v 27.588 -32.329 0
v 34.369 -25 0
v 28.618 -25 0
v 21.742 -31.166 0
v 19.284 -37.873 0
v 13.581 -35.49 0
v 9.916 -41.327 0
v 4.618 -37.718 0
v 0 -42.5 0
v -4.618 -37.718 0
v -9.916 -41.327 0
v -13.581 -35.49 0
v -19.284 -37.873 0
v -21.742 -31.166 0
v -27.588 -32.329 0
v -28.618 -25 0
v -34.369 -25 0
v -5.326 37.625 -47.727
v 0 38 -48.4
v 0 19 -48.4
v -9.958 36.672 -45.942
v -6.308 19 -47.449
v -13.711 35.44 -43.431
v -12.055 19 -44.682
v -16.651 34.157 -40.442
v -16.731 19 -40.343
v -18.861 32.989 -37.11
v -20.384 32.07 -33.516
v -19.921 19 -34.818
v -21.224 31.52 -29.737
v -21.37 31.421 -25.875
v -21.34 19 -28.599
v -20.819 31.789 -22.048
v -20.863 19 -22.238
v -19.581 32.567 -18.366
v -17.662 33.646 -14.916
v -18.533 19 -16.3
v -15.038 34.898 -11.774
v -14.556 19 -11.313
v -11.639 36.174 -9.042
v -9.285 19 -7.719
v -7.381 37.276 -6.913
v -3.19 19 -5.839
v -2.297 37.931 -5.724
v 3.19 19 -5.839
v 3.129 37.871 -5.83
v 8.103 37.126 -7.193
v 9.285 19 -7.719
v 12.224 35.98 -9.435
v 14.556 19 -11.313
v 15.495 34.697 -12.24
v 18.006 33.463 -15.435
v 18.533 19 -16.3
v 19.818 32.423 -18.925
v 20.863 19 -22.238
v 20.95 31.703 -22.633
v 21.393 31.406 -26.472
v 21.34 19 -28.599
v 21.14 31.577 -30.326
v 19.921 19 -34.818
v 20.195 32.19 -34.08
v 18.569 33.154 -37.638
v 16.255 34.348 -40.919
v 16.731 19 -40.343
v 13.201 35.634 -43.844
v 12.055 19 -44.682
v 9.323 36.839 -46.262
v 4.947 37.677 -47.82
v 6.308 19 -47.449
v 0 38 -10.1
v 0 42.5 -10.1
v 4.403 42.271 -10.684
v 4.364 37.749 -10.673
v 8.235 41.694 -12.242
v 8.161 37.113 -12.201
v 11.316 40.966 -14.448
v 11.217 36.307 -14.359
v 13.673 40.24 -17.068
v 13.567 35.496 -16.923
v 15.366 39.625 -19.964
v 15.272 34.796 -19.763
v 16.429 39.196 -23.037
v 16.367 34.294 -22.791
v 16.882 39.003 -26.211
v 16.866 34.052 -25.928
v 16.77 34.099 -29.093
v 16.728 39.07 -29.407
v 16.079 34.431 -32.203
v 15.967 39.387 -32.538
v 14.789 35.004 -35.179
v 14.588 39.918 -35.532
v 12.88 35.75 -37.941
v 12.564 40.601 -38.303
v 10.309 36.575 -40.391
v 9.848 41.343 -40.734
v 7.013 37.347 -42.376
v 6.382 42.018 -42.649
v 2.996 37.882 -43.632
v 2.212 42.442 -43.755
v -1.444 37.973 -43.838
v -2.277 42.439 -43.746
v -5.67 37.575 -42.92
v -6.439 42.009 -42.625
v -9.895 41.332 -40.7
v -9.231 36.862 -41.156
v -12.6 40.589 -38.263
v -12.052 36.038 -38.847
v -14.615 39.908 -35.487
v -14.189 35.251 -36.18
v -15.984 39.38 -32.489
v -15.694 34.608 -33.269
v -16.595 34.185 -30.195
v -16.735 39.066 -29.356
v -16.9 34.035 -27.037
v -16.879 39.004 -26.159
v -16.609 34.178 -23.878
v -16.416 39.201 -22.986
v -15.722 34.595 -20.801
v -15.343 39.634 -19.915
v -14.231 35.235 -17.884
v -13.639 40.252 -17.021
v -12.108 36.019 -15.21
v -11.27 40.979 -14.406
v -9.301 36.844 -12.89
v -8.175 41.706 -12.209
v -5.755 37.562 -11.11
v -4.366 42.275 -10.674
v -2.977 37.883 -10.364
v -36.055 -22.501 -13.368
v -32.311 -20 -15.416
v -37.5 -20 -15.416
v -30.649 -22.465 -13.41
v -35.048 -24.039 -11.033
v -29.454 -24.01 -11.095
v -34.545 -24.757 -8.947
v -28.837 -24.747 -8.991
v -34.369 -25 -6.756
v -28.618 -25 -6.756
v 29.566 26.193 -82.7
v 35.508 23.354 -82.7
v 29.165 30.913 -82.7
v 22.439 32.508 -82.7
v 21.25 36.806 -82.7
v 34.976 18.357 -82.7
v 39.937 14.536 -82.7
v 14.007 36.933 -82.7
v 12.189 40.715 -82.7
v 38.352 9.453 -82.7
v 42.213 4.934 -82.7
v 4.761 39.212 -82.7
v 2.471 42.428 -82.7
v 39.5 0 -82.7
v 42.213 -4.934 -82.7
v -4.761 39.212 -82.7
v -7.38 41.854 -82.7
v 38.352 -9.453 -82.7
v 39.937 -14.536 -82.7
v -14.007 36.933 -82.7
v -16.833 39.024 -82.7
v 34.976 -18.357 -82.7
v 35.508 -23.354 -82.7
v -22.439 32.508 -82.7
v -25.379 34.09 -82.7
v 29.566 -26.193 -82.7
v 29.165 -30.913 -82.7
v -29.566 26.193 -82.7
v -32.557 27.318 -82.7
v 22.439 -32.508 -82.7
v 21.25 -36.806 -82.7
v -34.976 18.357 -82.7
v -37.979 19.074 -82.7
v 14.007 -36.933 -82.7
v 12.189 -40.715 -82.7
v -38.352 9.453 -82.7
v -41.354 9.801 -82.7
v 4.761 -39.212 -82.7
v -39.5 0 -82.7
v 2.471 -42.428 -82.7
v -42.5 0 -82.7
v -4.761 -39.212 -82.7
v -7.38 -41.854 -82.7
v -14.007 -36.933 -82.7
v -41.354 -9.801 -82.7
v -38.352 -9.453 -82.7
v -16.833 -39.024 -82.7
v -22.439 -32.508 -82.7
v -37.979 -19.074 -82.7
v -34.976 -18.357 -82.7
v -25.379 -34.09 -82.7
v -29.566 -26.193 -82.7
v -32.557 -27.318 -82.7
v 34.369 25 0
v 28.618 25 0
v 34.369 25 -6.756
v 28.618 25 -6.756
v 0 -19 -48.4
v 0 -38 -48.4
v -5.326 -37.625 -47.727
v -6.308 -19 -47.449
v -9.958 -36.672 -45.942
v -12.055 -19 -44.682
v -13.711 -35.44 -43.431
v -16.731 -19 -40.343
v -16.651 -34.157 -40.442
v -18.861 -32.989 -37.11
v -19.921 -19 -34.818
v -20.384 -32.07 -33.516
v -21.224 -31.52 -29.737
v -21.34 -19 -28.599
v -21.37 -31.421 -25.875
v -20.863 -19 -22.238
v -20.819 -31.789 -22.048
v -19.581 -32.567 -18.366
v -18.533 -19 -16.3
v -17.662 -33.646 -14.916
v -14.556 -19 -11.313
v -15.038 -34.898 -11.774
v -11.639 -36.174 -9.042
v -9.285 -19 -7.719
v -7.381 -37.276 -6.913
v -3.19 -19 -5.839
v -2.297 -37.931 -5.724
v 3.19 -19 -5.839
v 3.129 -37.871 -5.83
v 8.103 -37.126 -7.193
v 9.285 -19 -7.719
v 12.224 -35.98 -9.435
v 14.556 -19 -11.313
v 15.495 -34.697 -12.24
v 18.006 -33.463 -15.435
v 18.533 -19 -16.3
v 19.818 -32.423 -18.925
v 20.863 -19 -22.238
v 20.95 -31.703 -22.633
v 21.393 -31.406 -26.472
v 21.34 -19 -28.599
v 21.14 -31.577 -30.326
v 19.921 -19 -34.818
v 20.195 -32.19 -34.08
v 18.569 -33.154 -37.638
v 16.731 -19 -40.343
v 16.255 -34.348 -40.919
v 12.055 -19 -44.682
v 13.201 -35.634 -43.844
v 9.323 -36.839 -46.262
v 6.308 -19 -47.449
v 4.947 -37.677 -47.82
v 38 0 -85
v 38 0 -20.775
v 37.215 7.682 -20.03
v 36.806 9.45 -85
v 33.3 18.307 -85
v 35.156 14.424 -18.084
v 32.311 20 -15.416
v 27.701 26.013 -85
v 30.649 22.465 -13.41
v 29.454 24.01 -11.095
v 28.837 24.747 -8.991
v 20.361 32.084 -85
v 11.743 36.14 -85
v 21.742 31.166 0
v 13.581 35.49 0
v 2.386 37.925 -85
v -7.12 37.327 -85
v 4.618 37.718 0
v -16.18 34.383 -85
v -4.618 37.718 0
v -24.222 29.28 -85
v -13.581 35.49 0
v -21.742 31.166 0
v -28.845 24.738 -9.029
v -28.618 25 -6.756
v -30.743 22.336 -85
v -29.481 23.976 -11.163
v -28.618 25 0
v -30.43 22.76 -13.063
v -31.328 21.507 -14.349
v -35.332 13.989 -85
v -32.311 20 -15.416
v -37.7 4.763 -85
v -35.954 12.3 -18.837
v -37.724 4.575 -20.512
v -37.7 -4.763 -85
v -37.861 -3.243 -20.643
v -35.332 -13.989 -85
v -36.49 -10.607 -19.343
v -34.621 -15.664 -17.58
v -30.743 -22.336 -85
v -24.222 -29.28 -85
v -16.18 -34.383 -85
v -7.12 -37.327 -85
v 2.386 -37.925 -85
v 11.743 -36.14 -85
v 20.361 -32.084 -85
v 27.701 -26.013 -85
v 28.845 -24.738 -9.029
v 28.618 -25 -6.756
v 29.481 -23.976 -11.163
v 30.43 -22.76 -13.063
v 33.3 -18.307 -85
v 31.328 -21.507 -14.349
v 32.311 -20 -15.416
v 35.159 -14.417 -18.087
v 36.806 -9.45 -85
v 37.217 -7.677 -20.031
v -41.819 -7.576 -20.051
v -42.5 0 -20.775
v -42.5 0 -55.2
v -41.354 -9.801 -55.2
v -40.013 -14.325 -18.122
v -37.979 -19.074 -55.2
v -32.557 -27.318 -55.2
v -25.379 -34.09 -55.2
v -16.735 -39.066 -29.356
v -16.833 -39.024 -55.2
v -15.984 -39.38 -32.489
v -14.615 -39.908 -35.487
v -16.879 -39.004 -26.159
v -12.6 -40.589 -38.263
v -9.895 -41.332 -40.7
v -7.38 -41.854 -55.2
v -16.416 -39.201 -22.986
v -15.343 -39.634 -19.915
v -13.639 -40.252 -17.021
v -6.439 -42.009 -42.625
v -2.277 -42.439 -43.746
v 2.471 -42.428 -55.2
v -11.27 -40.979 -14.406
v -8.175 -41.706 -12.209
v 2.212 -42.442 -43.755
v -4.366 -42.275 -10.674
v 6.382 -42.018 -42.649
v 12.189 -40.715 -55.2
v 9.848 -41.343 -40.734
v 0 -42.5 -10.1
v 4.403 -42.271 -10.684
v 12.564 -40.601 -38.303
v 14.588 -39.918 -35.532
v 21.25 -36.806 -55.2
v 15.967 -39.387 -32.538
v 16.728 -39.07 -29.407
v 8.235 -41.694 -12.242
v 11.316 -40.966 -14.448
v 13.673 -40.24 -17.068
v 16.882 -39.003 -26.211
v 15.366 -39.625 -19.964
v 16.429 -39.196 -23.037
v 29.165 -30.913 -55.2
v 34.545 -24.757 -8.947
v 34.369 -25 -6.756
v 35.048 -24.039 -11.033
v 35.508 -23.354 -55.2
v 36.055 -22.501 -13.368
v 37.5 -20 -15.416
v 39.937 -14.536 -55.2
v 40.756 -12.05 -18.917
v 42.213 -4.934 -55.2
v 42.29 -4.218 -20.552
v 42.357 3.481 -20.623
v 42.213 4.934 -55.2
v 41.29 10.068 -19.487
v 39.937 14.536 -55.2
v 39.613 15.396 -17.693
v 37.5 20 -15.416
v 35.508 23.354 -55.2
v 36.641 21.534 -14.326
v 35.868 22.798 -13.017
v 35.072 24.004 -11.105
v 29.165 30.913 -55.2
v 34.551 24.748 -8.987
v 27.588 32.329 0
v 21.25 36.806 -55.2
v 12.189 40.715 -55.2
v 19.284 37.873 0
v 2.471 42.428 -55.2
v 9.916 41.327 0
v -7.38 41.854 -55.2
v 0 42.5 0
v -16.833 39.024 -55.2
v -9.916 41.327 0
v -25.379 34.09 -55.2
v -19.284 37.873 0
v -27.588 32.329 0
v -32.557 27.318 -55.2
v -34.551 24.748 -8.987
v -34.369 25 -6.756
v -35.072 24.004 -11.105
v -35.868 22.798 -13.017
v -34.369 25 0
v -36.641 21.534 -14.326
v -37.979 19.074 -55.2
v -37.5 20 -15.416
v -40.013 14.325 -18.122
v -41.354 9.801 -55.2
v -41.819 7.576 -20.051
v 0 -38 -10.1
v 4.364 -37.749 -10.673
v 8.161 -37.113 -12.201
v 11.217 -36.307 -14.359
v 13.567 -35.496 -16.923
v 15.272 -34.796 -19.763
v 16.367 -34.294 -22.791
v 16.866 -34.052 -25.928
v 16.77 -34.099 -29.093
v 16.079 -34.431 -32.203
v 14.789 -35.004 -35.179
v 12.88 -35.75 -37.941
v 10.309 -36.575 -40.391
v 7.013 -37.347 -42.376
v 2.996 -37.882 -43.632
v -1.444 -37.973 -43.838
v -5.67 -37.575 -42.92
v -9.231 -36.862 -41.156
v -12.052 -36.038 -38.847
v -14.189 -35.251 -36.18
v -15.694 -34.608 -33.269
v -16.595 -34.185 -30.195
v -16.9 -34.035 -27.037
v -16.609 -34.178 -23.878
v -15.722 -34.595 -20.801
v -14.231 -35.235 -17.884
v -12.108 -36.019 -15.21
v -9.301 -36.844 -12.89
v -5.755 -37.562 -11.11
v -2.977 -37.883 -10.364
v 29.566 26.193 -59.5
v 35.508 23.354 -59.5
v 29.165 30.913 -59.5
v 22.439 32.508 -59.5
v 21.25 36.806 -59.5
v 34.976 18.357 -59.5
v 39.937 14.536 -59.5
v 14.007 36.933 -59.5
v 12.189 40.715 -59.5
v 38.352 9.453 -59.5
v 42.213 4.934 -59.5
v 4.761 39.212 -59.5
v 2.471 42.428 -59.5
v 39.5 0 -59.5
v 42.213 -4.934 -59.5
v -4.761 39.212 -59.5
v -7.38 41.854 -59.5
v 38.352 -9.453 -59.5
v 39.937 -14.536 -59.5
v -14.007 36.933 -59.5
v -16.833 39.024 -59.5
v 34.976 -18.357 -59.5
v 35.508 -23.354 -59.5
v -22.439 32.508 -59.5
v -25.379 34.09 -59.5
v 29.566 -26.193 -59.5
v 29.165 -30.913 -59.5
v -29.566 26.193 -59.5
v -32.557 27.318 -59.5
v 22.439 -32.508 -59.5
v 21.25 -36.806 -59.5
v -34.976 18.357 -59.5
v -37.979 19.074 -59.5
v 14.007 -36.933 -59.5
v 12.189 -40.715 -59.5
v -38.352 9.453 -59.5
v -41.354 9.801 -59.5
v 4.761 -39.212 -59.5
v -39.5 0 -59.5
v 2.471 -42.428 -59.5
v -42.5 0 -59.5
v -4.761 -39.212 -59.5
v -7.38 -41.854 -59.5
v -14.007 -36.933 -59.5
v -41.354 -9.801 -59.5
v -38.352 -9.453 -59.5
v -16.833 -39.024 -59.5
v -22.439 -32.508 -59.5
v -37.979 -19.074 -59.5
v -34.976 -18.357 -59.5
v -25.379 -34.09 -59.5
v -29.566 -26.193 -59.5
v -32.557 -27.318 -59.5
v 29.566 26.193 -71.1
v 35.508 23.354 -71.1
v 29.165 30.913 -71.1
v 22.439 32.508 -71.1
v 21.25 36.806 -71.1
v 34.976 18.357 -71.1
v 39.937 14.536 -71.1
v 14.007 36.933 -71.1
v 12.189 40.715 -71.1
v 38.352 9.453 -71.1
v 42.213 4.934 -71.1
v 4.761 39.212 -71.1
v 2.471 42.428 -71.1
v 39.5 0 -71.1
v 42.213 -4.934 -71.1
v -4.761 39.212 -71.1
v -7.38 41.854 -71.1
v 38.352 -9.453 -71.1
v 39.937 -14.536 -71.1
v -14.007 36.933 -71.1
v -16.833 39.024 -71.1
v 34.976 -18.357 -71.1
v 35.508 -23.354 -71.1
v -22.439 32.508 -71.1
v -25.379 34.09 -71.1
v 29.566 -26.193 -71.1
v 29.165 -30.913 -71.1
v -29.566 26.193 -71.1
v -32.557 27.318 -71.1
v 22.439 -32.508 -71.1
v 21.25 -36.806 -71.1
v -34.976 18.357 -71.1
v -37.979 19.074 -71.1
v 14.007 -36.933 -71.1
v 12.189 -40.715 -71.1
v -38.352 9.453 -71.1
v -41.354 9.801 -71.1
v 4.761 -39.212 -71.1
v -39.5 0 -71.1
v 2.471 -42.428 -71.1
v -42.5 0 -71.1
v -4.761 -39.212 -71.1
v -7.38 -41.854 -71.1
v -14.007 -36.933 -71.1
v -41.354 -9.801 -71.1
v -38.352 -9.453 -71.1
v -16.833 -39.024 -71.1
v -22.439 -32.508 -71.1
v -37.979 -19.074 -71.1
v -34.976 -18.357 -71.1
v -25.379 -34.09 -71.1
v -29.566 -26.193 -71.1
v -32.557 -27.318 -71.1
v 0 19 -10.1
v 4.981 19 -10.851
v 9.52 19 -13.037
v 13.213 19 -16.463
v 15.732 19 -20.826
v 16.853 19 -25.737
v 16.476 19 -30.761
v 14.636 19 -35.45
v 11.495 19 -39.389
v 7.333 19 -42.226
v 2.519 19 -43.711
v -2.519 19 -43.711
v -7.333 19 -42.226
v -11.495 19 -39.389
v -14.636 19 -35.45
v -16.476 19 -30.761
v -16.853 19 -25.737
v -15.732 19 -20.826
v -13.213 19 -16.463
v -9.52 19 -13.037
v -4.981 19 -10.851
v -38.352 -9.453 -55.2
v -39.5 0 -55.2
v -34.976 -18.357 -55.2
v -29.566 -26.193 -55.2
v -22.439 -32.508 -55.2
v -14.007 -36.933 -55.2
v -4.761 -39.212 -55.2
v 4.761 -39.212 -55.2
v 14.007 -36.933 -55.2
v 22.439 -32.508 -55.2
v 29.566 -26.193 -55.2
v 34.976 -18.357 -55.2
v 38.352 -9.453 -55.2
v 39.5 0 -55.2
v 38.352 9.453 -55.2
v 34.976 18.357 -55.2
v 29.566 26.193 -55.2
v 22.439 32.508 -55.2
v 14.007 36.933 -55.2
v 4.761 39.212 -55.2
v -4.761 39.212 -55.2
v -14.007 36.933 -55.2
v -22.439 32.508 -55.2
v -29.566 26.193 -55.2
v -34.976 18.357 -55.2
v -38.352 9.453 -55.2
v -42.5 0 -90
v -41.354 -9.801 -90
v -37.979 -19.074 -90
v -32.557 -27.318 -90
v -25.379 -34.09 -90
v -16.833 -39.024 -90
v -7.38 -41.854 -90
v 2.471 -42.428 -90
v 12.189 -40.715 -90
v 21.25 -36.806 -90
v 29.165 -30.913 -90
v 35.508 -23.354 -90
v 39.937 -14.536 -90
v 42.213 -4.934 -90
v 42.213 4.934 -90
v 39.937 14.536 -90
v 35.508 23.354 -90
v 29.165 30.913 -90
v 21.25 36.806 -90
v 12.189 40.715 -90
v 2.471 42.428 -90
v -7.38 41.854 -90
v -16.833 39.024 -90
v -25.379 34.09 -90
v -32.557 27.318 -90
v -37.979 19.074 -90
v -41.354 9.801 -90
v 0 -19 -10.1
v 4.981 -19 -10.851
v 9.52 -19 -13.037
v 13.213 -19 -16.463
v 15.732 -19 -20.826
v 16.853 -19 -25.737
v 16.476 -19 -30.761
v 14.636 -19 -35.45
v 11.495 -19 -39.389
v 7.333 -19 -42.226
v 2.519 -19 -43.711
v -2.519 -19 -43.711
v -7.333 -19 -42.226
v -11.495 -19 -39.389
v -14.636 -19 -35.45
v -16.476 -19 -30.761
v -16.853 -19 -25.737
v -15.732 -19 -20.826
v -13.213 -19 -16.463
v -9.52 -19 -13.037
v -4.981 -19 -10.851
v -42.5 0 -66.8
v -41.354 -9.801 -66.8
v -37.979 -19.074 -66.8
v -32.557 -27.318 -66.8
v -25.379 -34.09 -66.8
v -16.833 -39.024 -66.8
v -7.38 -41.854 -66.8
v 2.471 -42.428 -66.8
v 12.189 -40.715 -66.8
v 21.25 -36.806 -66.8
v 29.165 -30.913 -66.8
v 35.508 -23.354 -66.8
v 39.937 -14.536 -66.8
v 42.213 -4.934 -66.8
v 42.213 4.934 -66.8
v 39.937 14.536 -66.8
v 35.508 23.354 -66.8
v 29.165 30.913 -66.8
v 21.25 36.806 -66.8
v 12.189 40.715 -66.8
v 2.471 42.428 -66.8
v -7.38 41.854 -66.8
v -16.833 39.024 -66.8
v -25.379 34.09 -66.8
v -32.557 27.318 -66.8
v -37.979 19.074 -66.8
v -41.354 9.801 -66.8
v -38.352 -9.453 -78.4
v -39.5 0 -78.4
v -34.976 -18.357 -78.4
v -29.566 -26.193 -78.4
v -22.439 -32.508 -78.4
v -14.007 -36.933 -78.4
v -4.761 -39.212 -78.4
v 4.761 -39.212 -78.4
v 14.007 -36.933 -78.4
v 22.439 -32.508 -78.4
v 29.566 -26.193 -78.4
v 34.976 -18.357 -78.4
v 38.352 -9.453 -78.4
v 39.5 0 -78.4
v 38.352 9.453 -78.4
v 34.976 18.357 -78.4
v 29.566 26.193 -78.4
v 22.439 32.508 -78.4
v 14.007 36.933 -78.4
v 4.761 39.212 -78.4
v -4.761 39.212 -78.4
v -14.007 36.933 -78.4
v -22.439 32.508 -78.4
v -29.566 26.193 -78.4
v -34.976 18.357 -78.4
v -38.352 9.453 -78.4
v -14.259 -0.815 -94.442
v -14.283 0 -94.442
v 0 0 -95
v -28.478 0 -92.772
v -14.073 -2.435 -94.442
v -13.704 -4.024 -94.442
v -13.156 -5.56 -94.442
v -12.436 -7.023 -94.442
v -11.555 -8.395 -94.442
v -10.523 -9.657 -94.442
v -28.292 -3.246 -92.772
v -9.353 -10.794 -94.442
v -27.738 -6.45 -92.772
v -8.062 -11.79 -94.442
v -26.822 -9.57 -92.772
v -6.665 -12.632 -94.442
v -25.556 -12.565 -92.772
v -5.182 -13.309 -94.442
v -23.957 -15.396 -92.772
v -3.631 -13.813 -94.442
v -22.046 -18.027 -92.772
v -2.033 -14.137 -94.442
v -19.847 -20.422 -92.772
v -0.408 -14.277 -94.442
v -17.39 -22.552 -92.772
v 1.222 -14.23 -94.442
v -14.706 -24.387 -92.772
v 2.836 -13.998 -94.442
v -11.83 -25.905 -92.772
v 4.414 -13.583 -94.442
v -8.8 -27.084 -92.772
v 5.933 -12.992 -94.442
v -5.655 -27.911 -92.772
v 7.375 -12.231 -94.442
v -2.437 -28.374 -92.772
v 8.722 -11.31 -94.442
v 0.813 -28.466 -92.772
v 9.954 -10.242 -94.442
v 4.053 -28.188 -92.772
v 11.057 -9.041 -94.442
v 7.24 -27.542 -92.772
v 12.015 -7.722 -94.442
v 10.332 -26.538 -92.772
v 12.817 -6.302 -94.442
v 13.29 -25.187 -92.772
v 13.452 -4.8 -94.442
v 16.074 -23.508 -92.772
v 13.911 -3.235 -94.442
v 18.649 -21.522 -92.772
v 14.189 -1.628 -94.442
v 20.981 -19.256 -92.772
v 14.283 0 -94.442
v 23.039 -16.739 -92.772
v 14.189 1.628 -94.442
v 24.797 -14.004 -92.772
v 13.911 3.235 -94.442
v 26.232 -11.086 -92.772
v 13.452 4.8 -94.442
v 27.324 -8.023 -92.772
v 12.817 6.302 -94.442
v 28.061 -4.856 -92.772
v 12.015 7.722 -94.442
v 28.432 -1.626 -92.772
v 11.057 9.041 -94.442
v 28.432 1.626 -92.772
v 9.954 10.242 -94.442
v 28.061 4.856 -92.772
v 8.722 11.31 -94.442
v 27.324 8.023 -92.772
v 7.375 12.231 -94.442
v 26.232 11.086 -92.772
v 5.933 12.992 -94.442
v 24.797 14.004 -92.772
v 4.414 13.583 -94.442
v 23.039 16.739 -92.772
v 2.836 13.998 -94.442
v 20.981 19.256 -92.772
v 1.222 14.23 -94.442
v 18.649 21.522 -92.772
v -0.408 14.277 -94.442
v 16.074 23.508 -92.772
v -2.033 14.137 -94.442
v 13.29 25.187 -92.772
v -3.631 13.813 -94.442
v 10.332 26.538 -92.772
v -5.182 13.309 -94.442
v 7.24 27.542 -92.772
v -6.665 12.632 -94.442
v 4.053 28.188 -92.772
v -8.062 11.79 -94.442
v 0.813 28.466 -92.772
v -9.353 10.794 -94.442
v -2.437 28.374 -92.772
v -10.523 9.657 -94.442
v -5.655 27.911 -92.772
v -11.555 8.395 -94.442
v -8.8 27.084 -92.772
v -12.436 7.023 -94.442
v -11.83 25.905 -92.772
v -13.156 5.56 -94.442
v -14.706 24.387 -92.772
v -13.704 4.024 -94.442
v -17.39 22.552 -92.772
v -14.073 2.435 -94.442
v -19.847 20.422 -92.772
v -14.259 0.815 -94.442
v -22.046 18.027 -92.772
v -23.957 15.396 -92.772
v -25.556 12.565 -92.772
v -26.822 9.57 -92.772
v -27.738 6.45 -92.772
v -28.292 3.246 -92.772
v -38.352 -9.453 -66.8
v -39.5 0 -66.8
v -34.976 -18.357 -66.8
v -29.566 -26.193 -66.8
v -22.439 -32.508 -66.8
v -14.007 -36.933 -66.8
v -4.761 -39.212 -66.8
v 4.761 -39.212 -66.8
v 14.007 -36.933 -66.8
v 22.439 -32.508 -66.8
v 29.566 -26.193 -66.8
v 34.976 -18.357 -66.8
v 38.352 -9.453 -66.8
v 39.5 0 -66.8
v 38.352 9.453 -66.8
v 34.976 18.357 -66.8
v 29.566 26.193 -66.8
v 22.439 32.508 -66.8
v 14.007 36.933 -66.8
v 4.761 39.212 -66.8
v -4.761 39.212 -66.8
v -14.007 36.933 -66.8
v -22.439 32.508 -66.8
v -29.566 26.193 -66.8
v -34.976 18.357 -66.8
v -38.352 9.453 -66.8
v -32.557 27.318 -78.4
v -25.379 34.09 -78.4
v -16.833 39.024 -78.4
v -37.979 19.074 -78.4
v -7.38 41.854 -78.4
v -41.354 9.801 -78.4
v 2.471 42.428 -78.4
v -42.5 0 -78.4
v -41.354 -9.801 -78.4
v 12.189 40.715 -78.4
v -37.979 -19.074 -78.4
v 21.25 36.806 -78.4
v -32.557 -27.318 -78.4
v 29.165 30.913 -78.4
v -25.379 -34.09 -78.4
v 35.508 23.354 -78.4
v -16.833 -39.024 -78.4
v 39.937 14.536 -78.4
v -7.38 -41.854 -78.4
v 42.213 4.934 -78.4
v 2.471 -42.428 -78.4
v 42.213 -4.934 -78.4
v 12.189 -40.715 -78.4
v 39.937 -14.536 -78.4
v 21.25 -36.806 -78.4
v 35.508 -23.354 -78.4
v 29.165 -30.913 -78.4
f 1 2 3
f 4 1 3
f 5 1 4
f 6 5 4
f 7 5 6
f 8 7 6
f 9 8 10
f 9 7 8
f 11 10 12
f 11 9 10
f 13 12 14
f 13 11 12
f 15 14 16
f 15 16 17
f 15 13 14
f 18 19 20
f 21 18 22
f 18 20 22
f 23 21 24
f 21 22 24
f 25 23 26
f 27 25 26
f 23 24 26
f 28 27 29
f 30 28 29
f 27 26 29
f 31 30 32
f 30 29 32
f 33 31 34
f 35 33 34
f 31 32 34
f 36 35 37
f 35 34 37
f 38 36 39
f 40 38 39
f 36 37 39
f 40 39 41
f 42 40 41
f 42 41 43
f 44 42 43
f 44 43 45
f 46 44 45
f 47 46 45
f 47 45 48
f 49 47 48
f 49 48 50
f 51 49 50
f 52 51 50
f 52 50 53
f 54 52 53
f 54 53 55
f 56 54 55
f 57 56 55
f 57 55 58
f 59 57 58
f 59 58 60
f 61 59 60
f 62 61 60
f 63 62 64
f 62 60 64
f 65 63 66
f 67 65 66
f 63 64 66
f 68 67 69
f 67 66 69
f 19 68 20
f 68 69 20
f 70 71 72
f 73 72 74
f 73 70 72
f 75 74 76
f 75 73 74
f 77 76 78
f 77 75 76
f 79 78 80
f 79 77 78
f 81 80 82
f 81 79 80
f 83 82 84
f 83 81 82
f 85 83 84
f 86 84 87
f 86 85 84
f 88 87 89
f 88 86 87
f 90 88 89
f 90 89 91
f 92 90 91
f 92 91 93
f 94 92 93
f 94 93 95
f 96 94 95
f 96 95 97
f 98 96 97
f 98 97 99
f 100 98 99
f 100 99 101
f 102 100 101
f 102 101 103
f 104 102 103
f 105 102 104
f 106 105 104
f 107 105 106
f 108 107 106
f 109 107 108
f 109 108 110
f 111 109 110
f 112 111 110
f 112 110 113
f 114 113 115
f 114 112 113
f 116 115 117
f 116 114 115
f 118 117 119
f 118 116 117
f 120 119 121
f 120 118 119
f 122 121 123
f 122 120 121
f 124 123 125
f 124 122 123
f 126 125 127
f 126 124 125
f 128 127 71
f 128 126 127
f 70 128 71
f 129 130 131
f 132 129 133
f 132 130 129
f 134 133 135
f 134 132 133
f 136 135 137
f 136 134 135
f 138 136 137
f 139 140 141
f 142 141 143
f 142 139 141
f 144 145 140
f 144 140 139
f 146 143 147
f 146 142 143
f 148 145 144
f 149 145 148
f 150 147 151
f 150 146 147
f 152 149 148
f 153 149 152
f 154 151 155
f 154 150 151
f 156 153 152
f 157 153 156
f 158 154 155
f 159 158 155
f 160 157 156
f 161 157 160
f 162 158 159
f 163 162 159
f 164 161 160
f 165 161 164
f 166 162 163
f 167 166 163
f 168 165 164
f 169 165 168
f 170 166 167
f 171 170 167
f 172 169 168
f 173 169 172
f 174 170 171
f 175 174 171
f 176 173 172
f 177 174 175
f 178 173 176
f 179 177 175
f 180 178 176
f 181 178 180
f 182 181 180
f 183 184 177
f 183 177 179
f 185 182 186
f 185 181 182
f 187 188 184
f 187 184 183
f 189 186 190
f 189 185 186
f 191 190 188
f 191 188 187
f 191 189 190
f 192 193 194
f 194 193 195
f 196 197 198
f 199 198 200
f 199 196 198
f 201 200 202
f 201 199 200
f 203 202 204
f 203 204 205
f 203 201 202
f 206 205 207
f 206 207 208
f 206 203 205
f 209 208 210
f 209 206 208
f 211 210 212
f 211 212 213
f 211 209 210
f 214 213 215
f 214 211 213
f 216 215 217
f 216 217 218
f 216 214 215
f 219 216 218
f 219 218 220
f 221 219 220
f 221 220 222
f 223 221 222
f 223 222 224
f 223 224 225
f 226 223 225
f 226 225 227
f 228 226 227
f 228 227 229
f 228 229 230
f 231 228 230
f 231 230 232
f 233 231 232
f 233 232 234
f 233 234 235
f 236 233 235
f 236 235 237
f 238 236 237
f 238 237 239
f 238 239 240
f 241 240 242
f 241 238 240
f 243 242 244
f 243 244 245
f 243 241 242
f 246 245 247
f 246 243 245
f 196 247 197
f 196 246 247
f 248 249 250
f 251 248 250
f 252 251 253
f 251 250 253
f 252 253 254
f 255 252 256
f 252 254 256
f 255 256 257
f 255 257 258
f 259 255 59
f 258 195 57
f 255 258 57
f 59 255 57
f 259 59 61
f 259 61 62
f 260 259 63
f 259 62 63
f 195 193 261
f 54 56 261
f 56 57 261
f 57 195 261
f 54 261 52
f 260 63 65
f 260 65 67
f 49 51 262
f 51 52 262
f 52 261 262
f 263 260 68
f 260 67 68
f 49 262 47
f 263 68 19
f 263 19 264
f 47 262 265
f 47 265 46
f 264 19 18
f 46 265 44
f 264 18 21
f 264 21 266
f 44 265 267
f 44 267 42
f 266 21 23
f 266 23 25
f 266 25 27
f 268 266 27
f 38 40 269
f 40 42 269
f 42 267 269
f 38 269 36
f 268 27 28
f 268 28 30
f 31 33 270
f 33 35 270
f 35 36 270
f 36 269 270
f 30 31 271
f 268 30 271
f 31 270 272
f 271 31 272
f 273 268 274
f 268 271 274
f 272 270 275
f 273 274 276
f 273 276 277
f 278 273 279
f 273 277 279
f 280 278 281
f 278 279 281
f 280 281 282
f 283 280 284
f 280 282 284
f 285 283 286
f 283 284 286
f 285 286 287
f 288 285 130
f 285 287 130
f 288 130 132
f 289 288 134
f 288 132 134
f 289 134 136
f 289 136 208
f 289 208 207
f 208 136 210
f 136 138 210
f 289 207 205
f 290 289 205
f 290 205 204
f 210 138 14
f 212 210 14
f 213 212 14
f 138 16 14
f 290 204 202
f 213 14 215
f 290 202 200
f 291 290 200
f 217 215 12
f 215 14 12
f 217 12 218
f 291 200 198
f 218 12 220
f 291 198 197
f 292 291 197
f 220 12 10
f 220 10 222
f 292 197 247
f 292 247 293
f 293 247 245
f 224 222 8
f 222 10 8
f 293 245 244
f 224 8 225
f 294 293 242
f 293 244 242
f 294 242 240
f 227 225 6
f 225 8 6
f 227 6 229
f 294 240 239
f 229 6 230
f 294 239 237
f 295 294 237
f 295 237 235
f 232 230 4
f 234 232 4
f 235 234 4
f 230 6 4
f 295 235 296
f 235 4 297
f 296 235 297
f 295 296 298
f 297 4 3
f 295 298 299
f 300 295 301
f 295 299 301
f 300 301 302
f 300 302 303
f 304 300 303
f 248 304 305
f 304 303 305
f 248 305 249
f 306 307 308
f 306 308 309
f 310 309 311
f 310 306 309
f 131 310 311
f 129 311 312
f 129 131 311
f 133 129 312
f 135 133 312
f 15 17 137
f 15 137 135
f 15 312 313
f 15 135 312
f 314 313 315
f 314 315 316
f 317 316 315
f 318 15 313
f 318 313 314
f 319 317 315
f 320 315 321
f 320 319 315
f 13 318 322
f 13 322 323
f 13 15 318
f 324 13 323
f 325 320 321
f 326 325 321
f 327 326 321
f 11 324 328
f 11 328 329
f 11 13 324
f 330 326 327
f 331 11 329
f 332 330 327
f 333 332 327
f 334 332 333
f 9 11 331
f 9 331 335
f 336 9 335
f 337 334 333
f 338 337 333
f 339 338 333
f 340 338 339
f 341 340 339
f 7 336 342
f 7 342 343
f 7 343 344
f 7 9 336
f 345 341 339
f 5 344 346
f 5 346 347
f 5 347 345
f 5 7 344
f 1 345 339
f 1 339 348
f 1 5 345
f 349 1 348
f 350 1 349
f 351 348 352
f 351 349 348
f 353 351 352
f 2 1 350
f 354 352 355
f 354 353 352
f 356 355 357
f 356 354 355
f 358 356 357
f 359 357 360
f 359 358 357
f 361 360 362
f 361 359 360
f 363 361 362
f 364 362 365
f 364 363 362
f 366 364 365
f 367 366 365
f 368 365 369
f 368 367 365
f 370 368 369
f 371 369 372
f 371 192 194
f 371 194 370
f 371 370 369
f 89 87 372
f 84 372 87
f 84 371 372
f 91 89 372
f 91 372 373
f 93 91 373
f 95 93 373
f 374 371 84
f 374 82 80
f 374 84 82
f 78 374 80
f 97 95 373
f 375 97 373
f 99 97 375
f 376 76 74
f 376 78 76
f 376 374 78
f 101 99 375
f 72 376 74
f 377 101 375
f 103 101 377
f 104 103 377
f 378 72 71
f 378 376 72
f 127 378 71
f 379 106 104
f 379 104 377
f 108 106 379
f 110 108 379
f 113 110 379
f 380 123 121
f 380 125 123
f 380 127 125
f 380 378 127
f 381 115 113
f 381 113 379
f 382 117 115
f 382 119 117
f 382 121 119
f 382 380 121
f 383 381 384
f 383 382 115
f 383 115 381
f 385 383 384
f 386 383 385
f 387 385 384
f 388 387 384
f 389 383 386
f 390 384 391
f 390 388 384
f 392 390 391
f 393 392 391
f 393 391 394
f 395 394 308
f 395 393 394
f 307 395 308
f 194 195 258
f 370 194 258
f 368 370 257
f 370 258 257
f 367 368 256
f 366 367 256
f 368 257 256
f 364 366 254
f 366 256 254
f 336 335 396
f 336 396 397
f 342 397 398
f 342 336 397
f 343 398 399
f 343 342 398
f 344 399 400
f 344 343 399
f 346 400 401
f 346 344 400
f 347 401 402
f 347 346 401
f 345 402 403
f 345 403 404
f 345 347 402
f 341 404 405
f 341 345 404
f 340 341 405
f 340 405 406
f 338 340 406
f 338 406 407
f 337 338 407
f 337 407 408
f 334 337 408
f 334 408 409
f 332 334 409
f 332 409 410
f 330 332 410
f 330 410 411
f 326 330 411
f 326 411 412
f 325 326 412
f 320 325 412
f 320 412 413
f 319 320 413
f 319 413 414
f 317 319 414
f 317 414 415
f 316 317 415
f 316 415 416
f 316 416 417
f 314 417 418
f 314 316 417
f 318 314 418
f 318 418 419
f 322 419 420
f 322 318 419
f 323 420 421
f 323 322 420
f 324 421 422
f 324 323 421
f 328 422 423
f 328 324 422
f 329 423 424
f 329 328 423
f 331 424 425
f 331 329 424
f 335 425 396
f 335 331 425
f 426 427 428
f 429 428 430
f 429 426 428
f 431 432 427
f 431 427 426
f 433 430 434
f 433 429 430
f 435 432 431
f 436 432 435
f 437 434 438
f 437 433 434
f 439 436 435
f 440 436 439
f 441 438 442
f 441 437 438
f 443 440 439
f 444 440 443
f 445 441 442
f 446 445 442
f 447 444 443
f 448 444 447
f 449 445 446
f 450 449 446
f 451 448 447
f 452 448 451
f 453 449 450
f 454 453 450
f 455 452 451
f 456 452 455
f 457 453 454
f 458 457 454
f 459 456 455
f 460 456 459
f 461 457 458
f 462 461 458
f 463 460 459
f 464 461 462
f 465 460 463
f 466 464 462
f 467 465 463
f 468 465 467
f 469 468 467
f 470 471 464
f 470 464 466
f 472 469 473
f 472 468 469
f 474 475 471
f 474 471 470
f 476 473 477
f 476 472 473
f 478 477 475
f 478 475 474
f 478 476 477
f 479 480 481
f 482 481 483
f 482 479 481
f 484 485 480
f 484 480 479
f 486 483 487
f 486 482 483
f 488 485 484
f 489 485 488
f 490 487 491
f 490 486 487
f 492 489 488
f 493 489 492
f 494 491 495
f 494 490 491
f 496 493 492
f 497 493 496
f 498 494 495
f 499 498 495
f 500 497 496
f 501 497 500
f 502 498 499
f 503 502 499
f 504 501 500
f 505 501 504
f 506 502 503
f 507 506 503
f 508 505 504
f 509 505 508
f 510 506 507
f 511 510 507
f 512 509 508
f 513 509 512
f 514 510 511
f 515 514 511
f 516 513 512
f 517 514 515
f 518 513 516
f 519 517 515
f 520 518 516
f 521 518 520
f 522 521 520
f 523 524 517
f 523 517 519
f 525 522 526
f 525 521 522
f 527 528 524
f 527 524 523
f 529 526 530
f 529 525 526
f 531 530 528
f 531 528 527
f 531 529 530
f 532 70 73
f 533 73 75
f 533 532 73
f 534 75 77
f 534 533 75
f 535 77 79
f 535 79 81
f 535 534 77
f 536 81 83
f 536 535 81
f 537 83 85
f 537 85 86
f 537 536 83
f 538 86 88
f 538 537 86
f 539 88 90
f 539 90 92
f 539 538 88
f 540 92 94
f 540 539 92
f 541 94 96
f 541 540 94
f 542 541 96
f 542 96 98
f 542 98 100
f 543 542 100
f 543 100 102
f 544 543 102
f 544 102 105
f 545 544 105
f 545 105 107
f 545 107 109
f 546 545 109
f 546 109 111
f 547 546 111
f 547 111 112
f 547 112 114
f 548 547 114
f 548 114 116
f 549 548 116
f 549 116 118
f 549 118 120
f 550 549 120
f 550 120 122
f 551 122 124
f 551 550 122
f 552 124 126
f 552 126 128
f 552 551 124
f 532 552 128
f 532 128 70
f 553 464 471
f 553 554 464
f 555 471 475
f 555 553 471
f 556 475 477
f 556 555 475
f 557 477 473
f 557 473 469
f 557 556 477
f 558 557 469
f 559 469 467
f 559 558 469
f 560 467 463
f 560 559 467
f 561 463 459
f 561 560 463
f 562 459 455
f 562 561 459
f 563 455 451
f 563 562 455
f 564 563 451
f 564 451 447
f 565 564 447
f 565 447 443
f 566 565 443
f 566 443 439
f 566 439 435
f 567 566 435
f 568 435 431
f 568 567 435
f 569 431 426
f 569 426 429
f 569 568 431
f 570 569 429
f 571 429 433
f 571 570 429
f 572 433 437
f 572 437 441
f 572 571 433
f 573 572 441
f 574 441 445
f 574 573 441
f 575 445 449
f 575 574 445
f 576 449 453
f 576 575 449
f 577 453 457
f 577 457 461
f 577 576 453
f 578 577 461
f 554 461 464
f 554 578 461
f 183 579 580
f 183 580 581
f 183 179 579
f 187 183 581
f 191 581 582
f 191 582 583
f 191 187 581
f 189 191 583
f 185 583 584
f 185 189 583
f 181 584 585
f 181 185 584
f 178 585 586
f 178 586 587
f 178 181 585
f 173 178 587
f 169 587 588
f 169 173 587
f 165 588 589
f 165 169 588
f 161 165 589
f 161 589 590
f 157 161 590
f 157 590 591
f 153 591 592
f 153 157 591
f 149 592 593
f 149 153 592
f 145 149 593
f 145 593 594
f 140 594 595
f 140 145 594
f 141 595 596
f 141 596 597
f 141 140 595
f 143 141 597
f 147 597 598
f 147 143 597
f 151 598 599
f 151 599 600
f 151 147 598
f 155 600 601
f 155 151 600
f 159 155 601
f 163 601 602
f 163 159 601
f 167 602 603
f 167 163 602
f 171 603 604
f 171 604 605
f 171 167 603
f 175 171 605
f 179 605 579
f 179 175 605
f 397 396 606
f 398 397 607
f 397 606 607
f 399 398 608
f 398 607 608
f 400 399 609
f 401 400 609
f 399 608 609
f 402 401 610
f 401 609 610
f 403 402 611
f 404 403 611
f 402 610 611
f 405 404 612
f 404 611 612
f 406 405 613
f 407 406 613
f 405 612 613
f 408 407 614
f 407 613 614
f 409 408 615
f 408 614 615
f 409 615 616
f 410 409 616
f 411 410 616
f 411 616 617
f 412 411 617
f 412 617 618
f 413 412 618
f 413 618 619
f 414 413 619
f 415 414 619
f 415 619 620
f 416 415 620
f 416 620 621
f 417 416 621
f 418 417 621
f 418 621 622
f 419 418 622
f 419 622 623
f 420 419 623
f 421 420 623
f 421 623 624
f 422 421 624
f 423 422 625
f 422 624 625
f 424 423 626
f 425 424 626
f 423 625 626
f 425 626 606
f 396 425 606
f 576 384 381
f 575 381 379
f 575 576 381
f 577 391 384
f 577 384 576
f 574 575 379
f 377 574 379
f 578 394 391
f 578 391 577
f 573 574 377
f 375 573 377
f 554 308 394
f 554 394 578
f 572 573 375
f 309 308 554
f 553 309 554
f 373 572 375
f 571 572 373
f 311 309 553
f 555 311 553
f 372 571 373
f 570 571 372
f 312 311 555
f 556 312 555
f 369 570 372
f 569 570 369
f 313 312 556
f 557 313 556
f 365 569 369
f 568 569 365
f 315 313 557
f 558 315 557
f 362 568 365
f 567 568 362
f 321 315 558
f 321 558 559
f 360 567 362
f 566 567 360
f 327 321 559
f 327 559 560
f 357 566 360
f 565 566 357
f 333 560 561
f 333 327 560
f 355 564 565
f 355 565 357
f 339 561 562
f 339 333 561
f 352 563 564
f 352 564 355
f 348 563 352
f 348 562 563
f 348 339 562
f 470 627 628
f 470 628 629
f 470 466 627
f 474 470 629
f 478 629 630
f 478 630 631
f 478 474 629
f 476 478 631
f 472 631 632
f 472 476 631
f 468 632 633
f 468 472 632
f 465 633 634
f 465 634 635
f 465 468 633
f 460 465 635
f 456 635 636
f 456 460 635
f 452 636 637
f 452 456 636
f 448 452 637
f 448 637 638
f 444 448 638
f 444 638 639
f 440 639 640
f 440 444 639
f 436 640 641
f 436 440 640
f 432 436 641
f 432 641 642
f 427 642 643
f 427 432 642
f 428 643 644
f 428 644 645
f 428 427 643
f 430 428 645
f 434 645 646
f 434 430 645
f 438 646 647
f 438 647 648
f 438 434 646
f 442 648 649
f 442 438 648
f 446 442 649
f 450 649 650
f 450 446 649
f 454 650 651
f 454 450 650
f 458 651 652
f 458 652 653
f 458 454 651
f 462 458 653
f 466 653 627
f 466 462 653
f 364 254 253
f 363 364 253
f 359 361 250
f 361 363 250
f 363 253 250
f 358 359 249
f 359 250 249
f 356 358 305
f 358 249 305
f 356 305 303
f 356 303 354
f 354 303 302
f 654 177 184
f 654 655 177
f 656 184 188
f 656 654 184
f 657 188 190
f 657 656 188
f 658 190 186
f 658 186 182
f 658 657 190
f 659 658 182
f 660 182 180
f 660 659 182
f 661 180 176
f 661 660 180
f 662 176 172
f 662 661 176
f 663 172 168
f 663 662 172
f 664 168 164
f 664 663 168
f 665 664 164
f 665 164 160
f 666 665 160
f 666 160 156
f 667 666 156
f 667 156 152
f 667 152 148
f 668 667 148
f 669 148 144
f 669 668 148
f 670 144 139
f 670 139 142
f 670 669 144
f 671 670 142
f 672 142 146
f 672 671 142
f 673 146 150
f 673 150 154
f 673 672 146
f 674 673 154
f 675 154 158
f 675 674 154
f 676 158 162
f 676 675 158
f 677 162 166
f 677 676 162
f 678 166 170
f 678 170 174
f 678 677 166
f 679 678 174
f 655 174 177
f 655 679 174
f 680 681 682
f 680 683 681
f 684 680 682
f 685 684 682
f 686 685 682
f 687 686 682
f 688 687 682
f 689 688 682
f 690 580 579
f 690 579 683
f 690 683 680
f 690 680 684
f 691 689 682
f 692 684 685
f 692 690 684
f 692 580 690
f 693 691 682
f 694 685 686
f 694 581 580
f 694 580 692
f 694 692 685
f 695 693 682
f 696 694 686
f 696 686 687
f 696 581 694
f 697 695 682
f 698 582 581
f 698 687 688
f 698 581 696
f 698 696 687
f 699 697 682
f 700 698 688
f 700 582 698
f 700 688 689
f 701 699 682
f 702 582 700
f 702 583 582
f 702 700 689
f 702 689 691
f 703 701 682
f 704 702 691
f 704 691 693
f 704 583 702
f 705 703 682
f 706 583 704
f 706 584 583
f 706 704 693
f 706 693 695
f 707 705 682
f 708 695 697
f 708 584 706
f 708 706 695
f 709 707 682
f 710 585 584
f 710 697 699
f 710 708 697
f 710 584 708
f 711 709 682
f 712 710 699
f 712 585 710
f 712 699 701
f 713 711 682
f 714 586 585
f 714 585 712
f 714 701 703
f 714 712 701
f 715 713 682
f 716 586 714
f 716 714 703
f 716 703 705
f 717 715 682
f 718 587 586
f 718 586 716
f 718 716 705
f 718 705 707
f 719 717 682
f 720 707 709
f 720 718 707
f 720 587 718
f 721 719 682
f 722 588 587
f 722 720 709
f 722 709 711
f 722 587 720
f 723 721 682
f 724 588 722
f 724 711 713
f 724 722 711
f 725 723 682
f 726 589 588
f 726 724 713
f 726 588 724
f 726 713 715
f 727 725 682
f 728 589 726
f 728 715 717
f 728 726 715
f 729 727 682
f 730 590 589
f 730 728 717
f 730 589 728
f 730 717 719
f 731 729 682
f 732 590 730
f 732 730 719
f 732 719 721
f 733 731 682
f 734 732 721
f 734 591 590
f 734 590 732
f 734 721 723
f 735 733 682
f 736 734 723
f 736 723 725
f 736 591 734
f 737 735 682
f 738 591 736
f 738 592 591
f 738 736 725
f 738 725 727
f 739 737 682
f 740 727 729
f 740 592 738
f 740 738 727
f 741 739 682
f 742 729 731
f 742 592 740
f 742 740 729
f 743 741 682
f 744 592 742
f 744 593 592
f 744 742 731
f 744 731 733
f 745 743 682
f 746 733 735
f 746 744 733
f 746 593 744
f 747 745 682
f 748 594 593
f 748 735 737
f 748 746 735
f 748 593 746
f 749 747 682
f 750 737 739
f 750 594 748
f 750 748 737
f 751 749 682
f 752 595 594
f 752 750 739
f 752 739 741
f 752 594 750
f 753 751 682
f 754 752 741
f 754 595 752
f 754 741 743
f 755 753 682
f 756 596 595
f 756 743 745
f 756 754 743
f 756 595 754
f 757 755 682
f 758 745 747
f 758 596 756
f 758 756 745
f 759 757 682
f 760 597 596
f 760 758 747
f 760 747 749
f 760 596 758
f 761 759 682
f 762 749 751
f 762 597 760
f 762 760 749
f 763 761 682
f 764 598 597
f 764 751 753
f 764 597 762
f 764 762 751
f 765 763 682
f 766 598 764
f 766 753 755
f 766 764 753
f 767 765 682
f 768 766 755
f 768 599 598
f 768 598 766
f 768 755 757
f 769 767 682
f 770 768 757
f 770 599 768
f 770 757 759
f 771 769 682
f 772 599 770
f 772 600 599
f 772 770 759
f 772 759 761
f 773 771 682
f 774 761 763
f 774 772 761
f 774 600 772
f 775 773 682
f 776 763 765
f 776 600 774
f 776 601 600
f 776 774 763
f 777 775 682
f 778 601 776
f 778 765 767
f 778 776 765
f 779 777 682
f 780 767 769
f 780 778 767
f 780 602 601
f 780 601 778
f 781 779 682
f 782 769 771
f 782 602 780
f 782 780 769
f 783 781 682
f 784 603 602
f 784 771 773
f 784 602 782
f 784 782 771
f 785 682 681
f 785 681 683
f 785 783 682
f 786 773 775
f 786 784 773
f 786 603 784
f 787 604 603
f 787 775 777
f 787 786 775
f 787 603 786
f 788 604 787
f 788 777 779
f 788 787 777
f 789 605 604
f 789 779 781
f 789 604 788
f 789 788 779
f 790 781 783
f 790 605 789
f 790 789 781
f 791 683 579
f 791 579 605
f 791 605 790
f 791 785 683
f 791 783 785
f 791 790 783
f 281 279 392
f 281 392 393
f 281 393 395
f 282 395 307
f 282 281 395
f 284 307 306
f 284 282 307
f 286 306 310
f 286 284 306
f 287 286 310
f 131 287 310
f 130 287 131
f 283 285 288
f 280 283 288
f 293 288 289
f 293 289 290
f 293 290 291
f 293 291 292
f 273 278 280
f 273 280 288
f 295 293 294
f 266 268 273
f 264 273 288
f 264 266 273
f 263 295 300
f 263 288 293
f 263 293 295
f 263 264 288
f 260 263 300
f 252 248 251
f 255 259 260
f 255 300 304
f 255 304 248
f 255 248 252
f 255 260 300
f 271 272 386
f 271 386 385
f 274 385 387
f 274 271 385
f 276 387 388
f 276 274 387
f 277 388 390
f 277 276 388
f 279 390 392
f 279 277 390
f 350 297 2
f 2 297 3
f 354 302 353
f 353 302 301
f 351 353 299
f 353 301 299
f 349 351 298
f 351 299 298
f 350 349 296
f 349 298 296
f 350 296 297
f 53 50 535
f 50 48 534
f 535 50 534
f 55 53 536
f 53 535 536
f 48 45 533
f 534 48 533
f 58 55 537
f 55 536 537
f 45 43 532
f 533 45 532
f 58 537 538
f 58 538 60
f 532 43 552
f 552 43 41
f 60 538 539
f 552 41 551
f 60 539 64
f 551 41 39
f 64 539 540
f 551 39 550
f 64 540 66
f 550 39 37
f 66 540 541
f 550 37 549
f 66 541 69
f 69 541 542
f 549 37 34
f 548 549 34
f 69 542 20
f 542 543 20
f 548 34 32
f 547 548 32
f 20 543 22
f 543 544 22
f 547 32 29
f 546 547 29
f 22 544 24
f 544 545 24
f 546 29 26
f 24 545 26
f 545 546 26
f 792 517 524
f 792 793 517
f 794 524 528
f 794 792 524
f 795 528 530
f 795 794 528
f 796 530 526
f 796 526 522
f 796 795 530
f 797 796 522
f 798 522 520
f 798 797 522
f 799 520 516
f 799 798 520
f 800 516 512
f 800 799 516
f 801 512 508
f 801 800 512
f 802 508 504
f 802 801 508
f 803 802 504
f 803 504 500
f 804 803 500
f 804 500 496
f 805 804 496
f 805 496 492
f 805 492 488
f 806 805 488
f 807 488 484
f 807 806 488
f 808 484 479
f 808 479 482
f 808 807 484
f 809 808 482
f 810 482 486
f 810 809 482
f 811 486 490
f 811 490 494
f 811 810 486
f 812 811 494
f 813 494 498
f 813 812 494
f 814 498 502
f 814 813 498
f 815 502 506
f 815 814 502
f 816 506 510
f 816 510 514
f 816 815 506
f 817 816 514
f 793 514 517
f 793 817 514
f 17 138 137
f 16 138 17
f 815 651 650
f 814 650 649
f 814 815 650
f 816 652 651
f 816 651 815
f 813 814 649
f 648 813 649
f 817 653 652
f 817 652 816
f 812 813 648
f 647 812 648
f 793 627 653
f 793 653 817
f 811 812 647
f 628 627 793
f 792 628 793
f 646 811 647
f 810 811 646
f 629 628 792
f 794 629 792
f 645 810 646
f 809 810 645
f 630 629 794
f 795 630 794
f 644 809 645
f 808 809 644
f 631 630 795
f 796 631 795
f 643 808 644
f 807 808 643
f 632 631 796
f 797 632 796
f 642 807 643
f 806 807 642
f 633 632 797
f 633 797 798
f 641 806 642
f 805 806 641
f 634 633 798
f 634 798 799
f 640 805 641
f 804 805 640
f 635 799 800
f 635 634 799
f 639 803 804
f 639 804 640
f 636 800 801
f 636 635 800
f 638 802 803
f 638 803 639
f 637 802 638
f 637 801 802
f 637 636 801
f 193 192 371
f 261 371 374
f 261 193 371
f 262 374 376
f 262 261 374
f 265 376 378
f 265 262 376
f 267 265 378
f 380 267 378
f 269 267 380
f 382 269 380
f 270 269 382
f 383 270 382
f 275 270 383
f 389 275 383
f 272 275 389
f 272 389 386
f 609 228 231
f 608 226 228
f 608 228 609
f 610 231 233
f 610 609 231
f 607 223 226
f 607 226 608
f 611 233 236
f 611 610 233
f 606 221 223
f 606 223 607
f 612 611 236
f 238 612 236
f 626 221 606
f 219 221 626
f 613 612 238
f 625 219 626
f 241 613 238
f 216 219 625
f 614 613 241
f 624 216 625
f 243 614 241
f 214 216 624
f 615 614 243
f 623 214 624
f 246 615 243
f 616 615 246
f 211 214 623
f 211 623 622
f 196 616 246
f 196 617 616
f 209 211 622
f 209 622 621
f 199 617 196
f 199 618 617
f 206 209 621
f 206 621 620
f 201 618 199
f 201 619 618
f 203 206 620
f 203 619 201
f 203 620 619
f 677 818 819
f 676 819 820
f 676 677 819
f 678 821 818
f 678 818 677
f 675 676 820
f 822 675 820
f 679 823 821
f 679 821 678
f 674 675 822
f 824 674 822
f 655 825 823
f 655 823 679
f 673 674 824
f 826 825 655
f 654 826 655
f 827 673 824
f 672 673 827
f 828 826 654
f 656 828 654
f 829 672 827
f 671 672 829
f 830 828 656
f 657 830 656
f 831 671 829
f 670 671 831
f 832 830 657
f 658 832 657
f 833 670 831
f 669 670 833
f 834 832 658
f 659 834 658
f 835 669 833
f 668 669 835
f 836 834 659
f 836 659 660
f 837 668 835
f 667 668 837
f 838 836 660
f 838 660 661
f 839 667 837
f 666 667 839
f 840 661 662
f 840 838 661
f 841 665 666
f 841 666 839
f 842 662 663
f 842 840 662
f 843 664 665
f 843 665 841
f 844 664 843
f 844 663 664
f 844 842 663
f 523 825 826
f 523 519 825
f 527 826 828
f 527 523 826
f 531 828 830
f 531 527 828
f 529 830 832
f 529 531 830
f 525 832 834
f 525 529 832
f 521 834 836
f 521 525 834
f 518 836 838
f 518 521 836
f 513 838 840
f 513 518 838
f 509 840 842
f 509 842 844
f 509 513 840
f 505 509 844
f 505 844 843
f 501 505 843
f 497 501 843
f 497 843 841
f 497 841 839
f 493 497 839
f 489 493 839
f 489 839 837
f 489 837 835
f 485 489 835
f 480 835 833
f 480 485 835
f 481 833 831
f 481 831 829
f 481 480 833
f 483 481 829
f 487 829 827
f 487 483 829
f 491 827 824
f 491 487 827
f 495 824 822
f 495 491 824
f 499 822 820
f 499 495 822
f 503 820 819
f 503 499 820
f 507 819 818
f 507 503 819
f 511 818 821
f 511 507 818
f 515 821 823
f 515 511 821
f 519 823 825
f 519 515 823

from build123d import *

# Parameters (mm, degrees)
CUT_EXTRUDE1_DEPTH       = 113.41663578
CUT_EXTRUDE1_DEPTH_BACK  = 113.41663578
SKETCH3_R                = 16.9
SKETCH4_R                = 38
CUT_EXTRUDE2_DEPTH       = 85
BOSS_EXTRUDE2_REACH      = 133.417
BOSS_EXTRUDE2_END_RADIUS = 38
BOSS_EXTRUDE2_START      = 19
SKETCH5_R                = 21.4
SKETCH5_R_2              = 16.9
CUT_EXTRUDE3_START       = -25
CUT_EXTRUDE3_DEPTH       = 88.416635855


with BuildPart() as part:
    # Sketch2 → Revolve1 (revolve)
    with BuildSketch(Plane(origin=(0, 0, 0), x_dir=(1, 0, 0), z_dir=(0, 1, 0))):
        with BuildLine():
            Line((0, 90), (0, 95))
            ThreePointArc((0, 95), (-21.396553461, 93.745704417), (-42.5, 90))
            Line((-42.5, 90), (-42.5, 82.7))
            Line((-42.5, 82.7), (-39.5, 82.7))
            Line((-39.5, 82.7), (-39.5, 78.4))
            Line((-39.5, 78.4), (-42.5, 78.4))
            Line((-42.5, 78.4), (-42.5, 71.1))
            Line((-42.5, 71.1), (-39.5, 71.1))
            Line((-39.5, 71.1), (-39.5, 66.8))
            Line((-39.5, 66.8), (-42.5, 66.8))
            Line((-42.5, 66.8), (-42.5, 59.5))
            Line((-42.5, 59.5), (-39.5, 59.5))
            Line((-39.5, 59.5), (-39.5, 55.2))
            Line((-39.5, 55.2), (-42.5, 55.2))
            Line((-42.5, 55.2), (-42.5, 0))
            Line((-42.5, 0), (0, 0))
            Line((0, 0), (0, 90))
        make_face()
    revolve(axis=Axis((0, 0, -90), (0, 0, 1)))

    # Sketch3 → Cut-Extrude1 (cut, two sides: drawn at the far end of the back side and taken through both)
    with BuildSketch(Plane(origin=(0, 0, 0), x_dir=(1, 0, 0), z_dir=(0, 1, 0)).offset(-CUT_EXTRUDE1_DEPTH_BACK)):
        with Locations(Location((0, 27, 0), (0, 0, 270))):
            Circle(SKETCH3_R)
    extrude(amount=CUT_EXTRUDE1_DEPTH + CUT_EXTRUDE1_DEPTH_BACK, mode=Mode.SUBTRACT)

    # Sketch4 → Cut-Extrude2 (cut)
    with BuildSketch(Plane.XY):
        Circle(SKETCH4_R)
    extrude(amount=-CUT_EXTRUDE2_DEPTH, mode=Mode.SUBTRACT)

    # Boss-Extrude2: up to this cylinder (the profile starts inside it)
    boss_extrude2_end = Plane(origin=(0, 0, -6.205283), z_dir=(0, 0, 1)) * Cylinder(BOSS_EXTRUDE2_END_RADIUS, 343.834, mode=Mode.PRIVATE)
    # Sketch5 → Boss-Extrude2 (add, up to the surface)
    with BuildSketch(Plane(origin=(0, 0, 0), x_dir=(1, 0, 0), z_dir=(0, 1, 0)).offset(BOSS_EXTRUDE2_START), mode=Mode.PRIVATE) as boss_extrude2_sk1:
        with Locations(Location((0, 27, 0), (0, 0, 90))):
            Circle(SKETCH5_R)
        with Locations(Location((0, 27, 0), (0, 0, 270))):
            Circle(SKETCH5_R_2, mode=Mode.SUBTRACT)
    boss_extrude2_tool1 = extrude(boss_extrude2_sk1.sketch, amount=BOSS_EXTRUDE2_REACH, mode=Mode.PRIVATE) & boss_extrude2_end
    boss_extrude2 = boss_extrude2_tool1.solids().sort_by_distance((0, 19, -6.205283))[0]
    add(boss_extrude2)

    # Mirror1: Boss-Extrude2 across plane
    add(boss_extrude2.mirror(Plane.ZX))

    # Sketch6 → Cut-Extrude3 (cut, through all)
    with BuildSketch(Plane(origin=(0, 0, 0), x_dir=(0, 0, -1), z_dir=(1, 0, 0)).offset(CUT_EXTRUDE3_START)):
        with BuildLine():
            Line((0, -25), (0, 25))
            Line((0, 25), (6.755772122, 25))
            ThreePointArc((6.755772122, 25), (11.755772122, 23.660254038), (15.416026159, 20))
            ThreePointArc((15.416026159, 20), (20.775010008, 0), (15.416026159, -20))
            ThreePointArc((15.416026159, -20), (11.755772122, -23.660254038), (6.755772122, -25))
            Line((6.755772122, -25), (0, -25))
        make_face()
    cut_extrude3 = extrude(amount=-CUT_EXTRUDE3_DEPTH, mode=Mode.SUBTRACT)

    # Mirror2: Cut-Extrude3 across plane
    add(cut_extrude3.mirror(Plane(origin=(0, 0, 0), x_dir=(0, 0, 1), z_dir=(1, 0, 0))), mode=Mode.SUBTRACT)


solid = part.part
